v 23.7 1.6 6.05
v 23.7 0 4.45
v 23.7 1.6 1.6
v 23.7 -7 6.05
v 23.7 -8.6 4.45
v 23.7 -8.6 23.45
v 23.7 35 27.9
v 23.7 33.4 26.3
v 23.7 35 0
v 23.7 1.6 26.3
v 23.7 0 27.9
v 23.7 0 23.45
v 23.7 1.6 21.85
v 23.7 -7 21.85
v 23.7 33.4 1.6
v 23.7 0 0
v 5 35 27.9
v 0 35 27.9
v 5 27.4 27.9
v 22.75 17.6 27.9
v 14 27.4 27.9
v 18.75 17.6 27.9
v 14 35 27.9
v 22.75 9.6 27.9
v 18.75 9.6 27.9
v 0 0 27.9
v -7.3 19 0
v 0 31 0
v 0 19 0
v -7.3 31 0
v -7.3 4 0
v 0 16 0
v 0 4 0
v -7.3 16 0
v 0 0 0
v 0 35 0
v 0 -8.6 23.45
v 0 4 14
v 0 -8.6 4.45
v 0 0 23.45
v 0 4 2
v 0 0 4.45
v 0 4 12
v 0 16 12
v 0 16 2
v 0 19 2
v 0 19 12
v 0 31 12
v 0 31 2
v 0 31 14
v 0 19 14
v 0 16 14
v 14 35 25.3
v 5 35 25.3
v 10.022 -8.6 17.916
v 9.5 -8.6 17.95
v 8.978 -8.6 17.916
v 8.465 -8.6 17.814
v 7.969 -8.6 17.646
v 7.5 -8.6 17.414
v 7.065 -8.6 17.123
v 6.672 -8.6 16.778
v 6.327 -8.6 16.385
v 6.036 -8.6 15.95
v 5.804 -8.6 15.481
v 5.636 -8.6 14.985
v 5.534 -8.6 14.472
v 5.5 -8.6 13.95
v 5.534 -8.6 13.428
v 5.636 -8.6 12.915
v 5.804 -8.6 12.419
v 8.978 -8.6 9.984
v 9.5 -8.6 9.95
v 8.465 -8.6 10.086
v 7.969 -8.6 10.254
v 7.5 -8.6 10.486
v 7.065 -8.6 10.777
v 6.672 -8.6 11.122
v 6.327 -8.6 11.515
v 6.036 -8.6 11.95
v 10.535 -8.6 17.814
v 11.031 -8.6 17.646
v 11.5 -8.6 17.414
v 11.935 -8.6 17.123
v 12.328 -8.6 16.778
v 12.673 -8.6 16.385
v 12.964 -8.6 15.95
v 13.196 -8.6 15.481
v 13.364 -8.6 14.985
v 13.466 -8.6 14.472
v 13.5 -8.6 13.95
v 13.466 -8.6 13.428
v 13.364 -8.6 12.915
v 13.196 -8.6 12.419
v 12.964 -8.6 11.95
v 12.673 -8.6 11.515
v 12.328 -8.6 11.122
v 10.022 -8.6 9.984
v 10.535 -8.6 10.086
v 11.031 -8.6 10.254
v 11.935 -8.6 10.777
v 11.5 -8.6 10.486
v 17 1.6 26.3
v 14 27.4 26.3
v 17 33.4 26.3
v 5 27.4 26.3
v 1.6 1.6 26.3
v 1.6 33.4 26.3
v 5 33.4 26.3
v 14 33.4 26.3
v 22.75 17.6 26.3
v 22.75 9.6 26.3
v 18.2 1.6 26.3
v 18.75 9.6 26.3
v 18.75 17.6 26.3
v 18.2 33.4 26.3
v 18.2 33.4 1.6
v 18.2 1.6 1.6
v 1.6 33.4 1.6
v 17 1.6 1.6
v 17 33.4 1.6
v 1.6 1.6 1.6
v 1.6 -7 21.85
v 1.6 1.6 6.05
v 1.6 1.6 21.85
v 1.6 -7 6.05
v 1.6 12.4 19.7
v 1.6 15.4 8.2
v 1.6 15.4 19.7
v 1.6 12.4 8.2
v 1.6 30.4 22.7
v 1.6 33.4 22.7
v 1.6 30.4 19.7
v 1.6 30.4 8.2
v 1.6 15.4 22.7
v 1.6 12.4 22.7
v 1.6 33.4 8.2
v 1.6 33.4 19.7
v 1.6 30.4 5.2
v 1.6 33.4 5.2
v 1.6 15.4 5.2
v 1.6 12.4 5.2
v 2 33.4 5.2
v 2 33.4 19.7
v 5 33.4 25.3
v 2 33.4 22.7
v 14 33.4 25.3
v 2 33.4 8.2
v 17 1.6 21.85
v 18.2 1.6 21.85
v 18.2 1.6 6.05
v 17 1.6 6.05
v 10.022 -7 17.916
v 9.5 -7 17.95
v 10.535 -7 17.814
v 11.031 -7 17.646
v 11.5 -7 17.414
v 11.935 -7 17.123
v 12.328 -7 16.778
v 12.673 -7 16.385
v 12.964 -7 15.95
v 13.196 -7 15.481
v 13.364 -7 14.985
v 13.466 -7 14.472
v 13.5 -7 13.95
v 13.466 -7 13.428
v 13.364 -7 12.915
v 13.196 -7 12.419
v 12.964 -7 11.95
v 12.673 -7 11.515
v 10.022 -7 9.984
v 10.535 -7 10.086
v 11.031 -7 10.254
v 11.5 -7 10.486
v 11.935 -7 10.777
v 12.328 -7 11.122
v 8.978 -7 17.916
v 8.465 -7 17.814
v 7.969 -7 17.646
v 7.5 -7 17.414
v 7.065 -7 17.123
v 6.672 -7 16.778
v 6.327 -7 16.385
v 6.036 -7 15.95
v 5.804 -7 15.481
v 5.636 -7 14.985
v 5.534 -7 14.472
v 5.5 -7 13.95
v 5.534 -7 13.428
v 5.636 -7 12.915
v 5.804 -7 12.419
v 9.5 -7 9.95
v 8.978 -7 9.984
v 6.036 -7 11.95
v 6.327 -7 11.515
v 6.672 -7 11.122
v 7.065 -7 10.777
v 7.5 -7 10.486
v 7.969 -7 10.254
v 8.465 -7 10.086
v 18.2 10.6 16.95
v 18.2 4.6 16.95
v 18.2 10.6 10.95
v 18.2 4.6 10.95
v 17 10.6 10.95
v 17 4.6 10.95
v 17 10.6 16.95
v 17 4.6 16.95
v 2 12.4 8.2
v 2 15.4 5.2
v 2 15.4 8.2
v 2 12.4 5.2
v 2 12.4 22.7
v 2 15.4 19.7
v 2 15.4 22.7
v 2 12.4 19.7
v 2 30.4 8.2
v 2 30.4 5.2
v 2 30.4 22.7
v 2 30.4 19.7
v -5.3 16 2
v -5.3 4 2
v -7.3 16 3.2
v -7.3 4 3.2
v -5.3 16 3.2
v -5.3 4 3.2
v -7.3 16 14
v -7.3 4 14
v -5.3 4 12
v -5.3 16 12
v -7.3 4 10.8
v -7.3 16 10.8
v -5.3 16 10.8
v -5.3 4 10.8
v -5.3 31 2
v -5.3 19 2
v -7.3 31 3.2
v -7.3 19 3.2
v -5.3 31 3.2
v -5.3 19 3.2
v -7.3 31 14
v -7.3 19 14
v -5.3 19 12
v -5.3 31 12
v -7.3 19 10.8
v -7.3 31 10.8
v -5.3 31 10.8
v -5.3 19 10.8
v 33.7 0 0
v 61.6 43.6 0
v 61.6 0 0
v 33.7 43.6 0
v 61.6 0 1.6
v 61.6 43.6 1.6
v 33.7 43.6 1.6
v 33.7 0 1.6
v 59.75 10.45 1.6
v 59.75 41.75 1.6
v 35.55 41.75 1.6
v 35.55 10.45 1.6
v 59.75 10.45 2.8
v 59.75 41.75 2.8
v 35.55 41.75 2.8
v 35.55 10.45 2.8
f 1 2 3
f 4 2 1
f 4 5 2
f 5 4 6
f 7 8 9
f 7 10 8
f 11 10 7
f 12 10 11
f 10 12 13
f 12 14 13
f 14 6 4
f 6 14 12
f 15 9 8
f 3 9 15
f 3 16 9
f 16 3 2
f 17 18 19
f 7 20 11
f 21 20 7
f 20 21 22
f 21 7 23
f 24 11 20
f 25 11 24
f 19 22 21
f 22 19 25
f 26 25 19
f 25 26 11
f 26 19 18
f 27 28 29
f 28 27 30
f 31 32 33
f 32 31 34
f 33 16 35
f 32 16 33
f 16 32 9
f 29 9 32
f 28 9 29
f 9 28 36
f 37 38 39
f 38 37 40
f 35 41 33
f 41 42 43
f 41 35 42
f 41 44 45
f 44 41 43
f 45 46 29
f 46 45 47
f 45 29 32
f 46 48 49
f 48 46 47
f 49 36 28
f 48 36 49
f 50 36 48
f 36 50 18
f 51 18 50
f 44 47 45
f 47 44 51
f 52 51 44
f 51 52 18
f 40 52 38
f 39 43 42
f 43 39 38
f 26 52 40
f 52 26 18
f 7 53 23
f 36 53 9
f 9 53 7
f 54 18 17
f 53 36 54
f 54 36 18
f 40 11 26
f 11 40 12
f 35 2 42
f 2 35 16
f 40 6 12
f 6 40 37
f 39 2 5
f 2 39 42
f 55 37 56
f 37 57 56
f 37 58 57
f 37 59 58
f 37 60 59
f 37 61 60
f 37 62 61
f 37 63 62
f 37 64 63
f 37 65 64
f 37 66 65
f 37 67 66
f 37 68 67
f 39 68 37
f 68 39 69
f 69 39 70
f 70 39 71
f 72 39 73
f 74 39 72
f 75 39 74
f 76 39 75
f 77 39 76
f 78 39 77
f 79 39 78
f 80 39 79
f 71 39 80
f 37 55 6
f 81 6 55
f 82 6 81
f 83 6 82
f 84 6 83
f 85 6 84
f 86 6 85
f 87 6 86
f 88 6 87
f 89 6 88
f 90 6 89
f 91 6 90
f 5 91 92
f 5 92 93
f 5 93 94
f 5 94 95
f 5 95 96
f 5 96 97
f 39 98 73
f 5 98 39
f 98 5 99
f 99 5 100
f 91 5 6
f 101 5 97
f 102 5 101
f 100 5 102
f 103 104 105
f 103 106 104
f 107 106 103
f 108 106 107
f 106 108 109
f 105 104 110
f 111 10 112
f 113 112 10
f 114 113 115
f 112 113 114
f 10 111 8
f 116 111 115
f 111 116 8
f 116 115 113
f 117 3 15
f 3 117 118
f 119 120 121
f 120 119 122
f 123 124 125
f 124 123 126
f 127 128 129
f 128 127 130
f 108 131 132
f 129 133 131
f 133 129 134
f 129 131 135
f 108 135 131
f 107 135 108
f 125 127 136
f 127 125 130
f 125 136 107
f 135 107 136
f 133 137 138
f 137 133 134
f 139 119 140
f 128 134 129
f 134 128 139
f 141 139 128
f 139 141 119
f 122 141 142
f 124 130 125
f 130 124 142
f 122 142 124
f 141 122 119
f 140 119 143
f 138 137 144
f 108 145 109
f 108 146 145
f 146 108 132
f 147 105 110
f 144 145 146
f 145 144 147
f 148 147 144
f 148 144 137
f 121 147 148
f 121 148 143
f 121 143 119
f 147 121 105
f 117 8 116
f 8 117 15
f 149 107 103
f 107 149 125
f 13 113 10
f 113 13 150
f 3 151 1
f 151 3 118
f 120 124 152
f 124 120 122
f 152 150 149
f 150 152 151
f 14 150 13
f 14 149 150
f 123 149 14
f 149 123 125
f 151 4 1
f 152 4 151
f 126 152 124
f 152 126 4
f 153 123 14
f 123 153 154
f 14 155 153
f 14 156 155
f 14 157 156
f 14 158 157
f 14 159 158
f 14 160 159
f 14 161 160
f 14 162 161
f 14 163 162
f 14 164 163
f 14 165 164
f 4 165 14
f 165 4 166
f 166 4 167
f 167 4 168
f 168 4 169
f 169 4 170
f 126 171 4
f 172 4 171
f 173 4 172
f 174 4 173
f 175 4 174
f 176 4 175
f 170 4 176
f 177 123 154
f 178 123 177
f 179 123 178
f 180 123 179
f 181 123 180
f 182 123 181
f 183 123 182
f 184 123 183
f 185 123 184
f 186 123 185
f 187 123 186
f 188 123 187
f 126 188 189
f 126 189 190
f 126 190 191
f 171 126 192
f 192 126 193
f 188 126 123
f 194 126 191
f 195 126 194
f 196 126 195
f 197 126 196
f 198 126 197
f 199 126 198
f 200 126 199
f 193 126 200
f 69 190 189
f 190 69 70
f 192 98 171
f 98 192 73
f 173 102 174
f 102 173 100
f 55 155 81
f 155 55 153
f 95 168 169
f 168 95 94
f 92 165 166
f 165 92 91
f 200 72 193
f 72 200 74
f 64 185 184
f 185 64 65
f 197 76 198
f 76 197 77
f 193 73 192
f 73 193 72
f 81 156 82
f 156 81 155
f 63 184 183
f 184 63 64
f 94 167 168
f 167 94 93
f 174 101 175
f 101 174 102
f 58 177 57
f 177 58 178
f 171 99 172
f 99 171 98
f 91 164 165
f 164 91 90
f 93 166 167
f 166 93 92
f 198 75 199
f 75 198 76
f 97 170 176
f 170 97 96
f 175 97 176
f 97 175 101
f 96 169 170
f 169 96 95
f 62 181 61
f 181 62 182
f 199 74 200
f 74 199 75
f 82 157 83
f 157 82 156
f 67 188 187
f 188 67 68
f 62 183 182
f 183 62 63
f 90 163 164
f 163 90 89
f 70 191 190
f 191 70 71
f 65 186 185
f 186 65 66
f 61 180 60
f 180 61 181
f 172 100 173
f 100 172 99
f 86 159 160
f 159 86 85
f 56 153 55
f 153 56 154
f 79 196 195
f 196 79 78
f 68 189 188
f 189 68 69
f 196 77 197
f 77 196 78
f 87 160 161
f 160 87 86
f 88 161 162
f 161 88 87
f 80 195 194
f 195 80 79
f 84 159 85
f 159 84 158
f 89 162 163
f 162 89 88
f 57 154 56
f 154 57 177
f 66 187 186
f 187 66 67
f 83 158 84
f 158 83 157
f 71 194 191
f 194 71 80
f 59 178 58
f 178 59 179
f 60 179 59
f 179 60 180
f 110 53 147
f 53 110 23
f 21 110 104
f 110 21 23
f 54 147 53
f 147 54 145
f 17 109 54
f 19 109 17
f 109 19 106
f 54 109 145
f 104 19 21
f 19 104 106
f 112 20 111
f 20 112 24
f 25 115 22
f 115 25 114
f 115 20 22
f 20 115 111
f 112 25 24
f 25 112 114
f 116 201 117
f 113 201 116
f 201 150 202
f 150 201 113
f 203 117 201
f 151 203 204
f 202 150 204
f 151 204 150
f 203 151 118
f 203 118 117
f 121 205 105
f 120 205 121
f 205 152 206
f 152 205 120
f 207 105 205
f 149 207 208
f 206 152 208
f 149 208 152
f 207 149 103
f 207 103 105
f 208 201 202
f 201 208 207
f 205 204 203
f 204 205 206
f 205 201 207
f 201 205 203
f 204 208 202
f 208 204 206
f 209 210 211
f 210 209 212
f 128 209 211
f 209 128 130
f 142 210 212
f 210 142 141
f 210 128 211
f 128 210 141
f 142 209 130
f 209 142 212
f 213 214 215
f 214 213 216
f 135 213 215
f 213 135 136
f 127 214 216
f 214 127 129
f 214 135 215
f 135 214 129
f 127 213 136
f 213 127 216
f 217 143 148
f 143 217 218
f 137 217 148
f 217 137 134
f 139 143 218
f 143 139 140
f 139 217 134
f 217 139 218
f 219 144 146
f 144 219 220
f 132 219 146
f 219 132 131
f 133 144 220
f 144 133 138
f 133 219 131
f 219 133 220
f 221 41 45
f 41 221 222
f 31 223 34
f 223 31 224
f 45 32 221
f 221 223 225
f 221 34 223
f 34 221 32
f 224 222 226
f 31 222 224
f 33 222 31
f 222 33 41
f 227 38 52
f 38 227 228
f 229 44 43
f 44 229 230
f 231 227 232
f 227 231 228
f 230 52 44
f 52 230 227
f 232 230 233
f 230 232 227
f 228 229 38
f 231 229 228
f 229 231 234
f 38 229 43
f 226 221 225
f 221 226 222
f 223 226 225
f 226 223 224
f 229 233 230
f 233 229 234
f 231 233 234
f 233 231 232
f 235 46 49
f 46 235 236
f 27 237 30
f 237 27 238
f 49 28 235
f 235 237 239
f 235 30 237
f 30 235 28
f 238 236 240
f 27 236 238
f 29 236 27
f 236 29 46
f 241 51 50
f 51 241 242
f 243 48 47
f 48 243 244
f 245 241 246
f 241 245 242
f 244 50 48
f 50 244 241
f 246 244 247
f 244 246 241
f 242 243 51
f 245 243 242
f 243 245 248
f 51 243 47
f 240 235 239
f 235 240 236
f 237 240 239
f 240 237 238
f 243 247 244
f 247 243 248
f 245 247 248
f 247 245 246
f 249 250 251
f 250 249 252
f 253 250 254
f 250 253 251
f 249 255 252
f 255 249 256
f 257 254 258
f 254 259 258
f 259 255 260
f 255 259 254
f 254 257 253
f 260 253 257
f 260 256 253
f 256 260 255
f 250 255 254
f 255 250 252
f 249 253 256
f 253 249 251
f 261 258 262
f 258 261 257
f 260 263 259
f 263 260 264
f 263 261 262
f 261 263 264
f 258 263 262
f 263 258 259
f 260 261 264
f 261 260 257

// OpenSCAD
// ESP32-S3 controller case for glasses.
// Layout: board and battery sit SIDE BY SIDE across the case's thickness (X),
// both occupying roughly the same stretch of length (Y) — wider than a
// front-to-back layout, but much shorter. The board is back-aligned, so its
// vertical/top-entry USB-C port sits at the rear of the case; the flexible
// ribbon cable bridges the gap forward to the camera pod.
// The USB-C connector stands upright off the board (vertical/top-entry, per
// the product photo) so it's cut through the TOP wall, near the case's rear.
// Units: mm. MEASURE YOUR PARTS and edit the values below (defaults are placeholders).
//
// Axes:  X = across (X=0 is the wall nearest the glasses arm / the clip;
//            +X points away from the head, toward the lid)
//        Y = along the arm (Y=0 is the front wall; the camera pod sticks out toward -Y)
//        Z = up
//
// Cross-section (looking along Y, i.e. front-on):
//   [arm wall] [ BOARD lane (board_t thick) ] [partition] [ BATTERY lane (batt_t thick) ] [lid]
// Both lanes run the same length in Y — whichever part is longer sets the case length.
//
// part = "base", "lid" or "both". Render with F6, export STL with F7.
// Print the base as modeled (flat bottom on the bed) and the lid as modeled (flat).

part = "both";

/* ---------- ESP32-S3 board + expansion board (measured by user) ---------- */
// Stacked assembly: 21 x 17.5 x 15 mm (L x W x H).
// 21mm runs along the arm (Y), 17.5mm is the up/down footprint (Z),
// 15mm is the full stack thickness across X (board + expansion + headers).
board_l = 21;     // board+expansion footprint length, along the arm (Y)
board_w = 17.5;   // board+expansion footprint width, up-down (Z)
board_t = 15;     // full stack thickness across X (board + expansion + headers)

// USB-C port: vertical/top-entry connector (per the photo). Most of these small
// boards have the connector right at the board's edge, so the opening is cut as
// an open notch through BOTH the top wall and the back wall — flush with the
// true rear of the case, not inset. MEASURE the port's footprint and adjust.
usb_w      = 9;   // opening width across X (the connector's width, as seen from above)
usb_len    = 6;   // how far the notch reaches forward from the back edge (along Y)
usb_margin = 0;   // gap between the board's true rear edge and the port, if any (usually 0)

/* ---------- Remote camera module (MEASURE) ---------- */
// The ribbon connector is a wide ZIF socket sandwiched BETWEEN the two stacked
// PCBs (not against either outer face), roughly centred on the board's height.
// The board sits toward the back of the case (see board_y0), so the flexible
// ribbon bridges the gap forward to reach the camera pod at the front.
cam_mod_w   = 9;   // camera module width (square-ish PCB)
cam_mod_len = 6;   // camera module thickness, lens tip to back of PCB
cam_hole    = 8;   // hole for the lens barrel
ribbon_w    = 15;  // ribbon/connector width — looks close to the board's 17.5mm width; verify
cam_dx      = 0;   // shift lens left/right (X) from the board lane's centre
pod_dz      = 0;   // shift the camera pod up(+)/down(-) — 0 assumes the connector is
                   // centred on the board's height, as in the photo

/* ---------- Battery (measured by user: 1.22 x 0.94 x 0.2 in) ---------- */
batt_l = 31.0;     // battery length (along Y)   -- 1.22 in
batt_w = 23.9;     // battery width (along Z)    -- 0.94 in
batt_t = 5.1;      // battery thickness (along X) -- 0.20 in

/* ---------- Slide switch, top wall over the battery lane (MEASURE) ---------- */
sw_w            = 8;  // opening length along Y
sw_h            = 4;  // opening width along X
sw_y_from_front = 12; // distance from the case's front wall to the switch centre

/* ---------- Glasses arm and clip (MEASURE at the spot behind the hinge) ---------- */
arm_t     = 5;     // arm thickness (left-right) where the clip sits
arm_h     = 10;    // arm height (up-down) where the clip sits
clip_wall = 2;     // clip rail thickness (thin = more flex)
lip       = 1.2;   // how far each hook overlaps the arm's inner face (bigger = grips harder)
clip_len  = 12;    // length of each of the two clip segments along the arm
clip_y0   = 4;     // distance from the case front wall to the first clip segment
arm_dz    = 0;     // raise the arm slot above the floor (keep 0 for easiest printing)

/* ---------- General ---------- */
wall     = 1.6;
clear    = 0.4;    // print tolerance around parts
lane_gap = 1.2;    // partition thickness between the board and battery lanes
lid_t    = 1.6;
lid_gap  = 0.25;
plug_d   = 1.2;
$fn      = 48;

/* ---------- Derived (don't edit) ---------- */
ix = board_t + lane_gap + batt_t + 2*clear;   // total interior thickness (X): both lanes + partition
iz = max(board_w, batt_w) + 2*clear;          // interior height (Z): sized to the taller part (battery)
iy = max(board_l, batt_l) + 2*clear;          // interior length (Y): sized to the longer part (battery)
ox = wall + ix;
oy = wall + iy + wall;
oz = iz + 2*wall;

x_b0   = wall + clear;                 // board lane inner (arm-facing) surface, X
x_bat0 = x_b0 + board_t + lane_gap;    // battery lane inner surface, X

board_y0 = oy - wall - board_l;        // board back-aligned, so the USB end sits at the rear of the
                                        // case. Leaves a gap of iy - board_l (~11mm) between the
                                        // board's ribbon connector and the camera pod — the ribbon is
                                        // flexible enough to bridge that gap on its own.
board_z0 = wall + (iz - board_w)/2;    // board centred vertically in the case

usb_x = x_b0 + board_t/2 - usb_w/2;
usb_y = oy - wall - usb_margin - usb_len;  // notch starts here and runs to the true back edge

sw_x = x_bat0 + batt_t/2;

pod_w  = max(cam_mod_w, ribbon_w) + 2*clear + 2*wall;  // pod height (Z), fits camera or ribbon
pod_d  = wall + cam_mod_len + 1;                        // pod depth (Y), sticks out at -Y
pod_zc = oz/2 + pod_dz;                                 // matches board's vertical centre
cam_x  = x_b0 + board_t/2 + cam_dx;                     // aligned with the board lane, not case centre

arm_x  = arm_t + 0.3;               // clip channel depth incl. slack
arm_z0 = clip_wall + arm_dz;        // bottom of the arm slot

module clip_segment(y0) {
    // bottom rail (sits on the print bed) and top rail, each with a hook lip
    // that catches the arm's inner face so it snaps in from the head side.
    translate([-(arm_x + clip_wall), y0, 0]) {
        cube([arm_x + clip_wall + 0.01, clip_len, clip_wall + arm_dz]);           // bottom rail
        translate([0, 0, arm_z0 + arm_h])
            cube([arm_x + clip_wall + 0.01, clip_len, clip_wall]);                // top rail
        cube([clip_wall, clip_len, arm_z0 + lip]);                                // bottom lip
        translate([0, 0, arm_z0 + arm_h - lip])
            cube([clip_wall, clip_len, lip + clip_wall]);                         // top lip
    }
}

module partition() {
    difference() {
        translate([x_b0 + board_t, wall, wall]) cube([lane_gap, iy, iz]);
        // wire pass-through near the front, for the battery leads to reach the board
        translate([x_b0 + board_t - 1, wall + 3, wall + iz/2 - 3]) cube([lane_gap + 2, 6, 6]);
    }
}

module board_posts() {
    post = 3;
    for (yy = [board_y0, board_y0 + board_l - post])
        for (zz = [board_z0, board_z0 + board_w - post])
            translate([wall - 0.01, yy, zz]) cube([clear + 0.01, post, post]);
}

module base() {
    difference() {
        union() {
            cube([ox, oy, oz]);                                                         // main box
            translate([0, -pod_d, pod_zc - pod_w/2]) cube([ox, pod_d + 0.01, pod_w]);    // camera pod
        }
        // main cavity, open on the outer (+X, lid) face
        translate([wall, wall, wall]) cube([ix + 1, iy, iz]);
        // camera pocket, joins the cavity so the board's ribbon has a free, short path
        translate([wall, -pod_d + wall, pod_zc - pod_w/2 + wall])
            cube([ix + 1, pod_d + 0.5, pod_w - 2*wall]);
        // lens hole through the pod front wall
        translate([cam_x, -pod_d - 1, pod_zc]) rotate([-90, 0, 0]) cylinder(d = cam_hole, h = wall + 2);
        // USB-C opening: an open notch through the top wall AND the back wall,
        // flush with the true rear of the case (vertical-entry connector at the board's edge)
        translate([usb_x, usb_y, oz - wall - 1]) cube([usb_w, usb_len + wall + 2, wall + 2]);
        // switch opening in the top wall, over the battery lane
        translate([sw_x - sw_h/2, wall + sw_y_from_front - sw_w/2, oz - wall - 1])
            cube([sw_h, sw_w, wall + 2]);
    }
    partition();
    board_posts();
    // two snap-on clip segments that grip the arm
    clip_segment(clip_y0);
    clip_segment(oy - clip_y0 - clip_len);
}

module lid() {
    // plate covers the outer face of the case and the camera pod
    translate([0, -pod_d, 0]) cube([lid_t, oy + pod_d, oz]);
    // short plug locates the lid in the cavity
    translate([-plug_d, wall + lid_gap, wall + lid_gap])
        cube([plug_d + 0.01, iy - 2*lid_gap, iz - 2*lid_gap]);
}

if (part == "base" || part == "both") base();
// lid laid flat (plate down, plug up) beside the base
if (part == "lid" || part == "both")
    translate([ox + 10, pod_d, lid_t]) rotate([0, 90, 0]) lid();
